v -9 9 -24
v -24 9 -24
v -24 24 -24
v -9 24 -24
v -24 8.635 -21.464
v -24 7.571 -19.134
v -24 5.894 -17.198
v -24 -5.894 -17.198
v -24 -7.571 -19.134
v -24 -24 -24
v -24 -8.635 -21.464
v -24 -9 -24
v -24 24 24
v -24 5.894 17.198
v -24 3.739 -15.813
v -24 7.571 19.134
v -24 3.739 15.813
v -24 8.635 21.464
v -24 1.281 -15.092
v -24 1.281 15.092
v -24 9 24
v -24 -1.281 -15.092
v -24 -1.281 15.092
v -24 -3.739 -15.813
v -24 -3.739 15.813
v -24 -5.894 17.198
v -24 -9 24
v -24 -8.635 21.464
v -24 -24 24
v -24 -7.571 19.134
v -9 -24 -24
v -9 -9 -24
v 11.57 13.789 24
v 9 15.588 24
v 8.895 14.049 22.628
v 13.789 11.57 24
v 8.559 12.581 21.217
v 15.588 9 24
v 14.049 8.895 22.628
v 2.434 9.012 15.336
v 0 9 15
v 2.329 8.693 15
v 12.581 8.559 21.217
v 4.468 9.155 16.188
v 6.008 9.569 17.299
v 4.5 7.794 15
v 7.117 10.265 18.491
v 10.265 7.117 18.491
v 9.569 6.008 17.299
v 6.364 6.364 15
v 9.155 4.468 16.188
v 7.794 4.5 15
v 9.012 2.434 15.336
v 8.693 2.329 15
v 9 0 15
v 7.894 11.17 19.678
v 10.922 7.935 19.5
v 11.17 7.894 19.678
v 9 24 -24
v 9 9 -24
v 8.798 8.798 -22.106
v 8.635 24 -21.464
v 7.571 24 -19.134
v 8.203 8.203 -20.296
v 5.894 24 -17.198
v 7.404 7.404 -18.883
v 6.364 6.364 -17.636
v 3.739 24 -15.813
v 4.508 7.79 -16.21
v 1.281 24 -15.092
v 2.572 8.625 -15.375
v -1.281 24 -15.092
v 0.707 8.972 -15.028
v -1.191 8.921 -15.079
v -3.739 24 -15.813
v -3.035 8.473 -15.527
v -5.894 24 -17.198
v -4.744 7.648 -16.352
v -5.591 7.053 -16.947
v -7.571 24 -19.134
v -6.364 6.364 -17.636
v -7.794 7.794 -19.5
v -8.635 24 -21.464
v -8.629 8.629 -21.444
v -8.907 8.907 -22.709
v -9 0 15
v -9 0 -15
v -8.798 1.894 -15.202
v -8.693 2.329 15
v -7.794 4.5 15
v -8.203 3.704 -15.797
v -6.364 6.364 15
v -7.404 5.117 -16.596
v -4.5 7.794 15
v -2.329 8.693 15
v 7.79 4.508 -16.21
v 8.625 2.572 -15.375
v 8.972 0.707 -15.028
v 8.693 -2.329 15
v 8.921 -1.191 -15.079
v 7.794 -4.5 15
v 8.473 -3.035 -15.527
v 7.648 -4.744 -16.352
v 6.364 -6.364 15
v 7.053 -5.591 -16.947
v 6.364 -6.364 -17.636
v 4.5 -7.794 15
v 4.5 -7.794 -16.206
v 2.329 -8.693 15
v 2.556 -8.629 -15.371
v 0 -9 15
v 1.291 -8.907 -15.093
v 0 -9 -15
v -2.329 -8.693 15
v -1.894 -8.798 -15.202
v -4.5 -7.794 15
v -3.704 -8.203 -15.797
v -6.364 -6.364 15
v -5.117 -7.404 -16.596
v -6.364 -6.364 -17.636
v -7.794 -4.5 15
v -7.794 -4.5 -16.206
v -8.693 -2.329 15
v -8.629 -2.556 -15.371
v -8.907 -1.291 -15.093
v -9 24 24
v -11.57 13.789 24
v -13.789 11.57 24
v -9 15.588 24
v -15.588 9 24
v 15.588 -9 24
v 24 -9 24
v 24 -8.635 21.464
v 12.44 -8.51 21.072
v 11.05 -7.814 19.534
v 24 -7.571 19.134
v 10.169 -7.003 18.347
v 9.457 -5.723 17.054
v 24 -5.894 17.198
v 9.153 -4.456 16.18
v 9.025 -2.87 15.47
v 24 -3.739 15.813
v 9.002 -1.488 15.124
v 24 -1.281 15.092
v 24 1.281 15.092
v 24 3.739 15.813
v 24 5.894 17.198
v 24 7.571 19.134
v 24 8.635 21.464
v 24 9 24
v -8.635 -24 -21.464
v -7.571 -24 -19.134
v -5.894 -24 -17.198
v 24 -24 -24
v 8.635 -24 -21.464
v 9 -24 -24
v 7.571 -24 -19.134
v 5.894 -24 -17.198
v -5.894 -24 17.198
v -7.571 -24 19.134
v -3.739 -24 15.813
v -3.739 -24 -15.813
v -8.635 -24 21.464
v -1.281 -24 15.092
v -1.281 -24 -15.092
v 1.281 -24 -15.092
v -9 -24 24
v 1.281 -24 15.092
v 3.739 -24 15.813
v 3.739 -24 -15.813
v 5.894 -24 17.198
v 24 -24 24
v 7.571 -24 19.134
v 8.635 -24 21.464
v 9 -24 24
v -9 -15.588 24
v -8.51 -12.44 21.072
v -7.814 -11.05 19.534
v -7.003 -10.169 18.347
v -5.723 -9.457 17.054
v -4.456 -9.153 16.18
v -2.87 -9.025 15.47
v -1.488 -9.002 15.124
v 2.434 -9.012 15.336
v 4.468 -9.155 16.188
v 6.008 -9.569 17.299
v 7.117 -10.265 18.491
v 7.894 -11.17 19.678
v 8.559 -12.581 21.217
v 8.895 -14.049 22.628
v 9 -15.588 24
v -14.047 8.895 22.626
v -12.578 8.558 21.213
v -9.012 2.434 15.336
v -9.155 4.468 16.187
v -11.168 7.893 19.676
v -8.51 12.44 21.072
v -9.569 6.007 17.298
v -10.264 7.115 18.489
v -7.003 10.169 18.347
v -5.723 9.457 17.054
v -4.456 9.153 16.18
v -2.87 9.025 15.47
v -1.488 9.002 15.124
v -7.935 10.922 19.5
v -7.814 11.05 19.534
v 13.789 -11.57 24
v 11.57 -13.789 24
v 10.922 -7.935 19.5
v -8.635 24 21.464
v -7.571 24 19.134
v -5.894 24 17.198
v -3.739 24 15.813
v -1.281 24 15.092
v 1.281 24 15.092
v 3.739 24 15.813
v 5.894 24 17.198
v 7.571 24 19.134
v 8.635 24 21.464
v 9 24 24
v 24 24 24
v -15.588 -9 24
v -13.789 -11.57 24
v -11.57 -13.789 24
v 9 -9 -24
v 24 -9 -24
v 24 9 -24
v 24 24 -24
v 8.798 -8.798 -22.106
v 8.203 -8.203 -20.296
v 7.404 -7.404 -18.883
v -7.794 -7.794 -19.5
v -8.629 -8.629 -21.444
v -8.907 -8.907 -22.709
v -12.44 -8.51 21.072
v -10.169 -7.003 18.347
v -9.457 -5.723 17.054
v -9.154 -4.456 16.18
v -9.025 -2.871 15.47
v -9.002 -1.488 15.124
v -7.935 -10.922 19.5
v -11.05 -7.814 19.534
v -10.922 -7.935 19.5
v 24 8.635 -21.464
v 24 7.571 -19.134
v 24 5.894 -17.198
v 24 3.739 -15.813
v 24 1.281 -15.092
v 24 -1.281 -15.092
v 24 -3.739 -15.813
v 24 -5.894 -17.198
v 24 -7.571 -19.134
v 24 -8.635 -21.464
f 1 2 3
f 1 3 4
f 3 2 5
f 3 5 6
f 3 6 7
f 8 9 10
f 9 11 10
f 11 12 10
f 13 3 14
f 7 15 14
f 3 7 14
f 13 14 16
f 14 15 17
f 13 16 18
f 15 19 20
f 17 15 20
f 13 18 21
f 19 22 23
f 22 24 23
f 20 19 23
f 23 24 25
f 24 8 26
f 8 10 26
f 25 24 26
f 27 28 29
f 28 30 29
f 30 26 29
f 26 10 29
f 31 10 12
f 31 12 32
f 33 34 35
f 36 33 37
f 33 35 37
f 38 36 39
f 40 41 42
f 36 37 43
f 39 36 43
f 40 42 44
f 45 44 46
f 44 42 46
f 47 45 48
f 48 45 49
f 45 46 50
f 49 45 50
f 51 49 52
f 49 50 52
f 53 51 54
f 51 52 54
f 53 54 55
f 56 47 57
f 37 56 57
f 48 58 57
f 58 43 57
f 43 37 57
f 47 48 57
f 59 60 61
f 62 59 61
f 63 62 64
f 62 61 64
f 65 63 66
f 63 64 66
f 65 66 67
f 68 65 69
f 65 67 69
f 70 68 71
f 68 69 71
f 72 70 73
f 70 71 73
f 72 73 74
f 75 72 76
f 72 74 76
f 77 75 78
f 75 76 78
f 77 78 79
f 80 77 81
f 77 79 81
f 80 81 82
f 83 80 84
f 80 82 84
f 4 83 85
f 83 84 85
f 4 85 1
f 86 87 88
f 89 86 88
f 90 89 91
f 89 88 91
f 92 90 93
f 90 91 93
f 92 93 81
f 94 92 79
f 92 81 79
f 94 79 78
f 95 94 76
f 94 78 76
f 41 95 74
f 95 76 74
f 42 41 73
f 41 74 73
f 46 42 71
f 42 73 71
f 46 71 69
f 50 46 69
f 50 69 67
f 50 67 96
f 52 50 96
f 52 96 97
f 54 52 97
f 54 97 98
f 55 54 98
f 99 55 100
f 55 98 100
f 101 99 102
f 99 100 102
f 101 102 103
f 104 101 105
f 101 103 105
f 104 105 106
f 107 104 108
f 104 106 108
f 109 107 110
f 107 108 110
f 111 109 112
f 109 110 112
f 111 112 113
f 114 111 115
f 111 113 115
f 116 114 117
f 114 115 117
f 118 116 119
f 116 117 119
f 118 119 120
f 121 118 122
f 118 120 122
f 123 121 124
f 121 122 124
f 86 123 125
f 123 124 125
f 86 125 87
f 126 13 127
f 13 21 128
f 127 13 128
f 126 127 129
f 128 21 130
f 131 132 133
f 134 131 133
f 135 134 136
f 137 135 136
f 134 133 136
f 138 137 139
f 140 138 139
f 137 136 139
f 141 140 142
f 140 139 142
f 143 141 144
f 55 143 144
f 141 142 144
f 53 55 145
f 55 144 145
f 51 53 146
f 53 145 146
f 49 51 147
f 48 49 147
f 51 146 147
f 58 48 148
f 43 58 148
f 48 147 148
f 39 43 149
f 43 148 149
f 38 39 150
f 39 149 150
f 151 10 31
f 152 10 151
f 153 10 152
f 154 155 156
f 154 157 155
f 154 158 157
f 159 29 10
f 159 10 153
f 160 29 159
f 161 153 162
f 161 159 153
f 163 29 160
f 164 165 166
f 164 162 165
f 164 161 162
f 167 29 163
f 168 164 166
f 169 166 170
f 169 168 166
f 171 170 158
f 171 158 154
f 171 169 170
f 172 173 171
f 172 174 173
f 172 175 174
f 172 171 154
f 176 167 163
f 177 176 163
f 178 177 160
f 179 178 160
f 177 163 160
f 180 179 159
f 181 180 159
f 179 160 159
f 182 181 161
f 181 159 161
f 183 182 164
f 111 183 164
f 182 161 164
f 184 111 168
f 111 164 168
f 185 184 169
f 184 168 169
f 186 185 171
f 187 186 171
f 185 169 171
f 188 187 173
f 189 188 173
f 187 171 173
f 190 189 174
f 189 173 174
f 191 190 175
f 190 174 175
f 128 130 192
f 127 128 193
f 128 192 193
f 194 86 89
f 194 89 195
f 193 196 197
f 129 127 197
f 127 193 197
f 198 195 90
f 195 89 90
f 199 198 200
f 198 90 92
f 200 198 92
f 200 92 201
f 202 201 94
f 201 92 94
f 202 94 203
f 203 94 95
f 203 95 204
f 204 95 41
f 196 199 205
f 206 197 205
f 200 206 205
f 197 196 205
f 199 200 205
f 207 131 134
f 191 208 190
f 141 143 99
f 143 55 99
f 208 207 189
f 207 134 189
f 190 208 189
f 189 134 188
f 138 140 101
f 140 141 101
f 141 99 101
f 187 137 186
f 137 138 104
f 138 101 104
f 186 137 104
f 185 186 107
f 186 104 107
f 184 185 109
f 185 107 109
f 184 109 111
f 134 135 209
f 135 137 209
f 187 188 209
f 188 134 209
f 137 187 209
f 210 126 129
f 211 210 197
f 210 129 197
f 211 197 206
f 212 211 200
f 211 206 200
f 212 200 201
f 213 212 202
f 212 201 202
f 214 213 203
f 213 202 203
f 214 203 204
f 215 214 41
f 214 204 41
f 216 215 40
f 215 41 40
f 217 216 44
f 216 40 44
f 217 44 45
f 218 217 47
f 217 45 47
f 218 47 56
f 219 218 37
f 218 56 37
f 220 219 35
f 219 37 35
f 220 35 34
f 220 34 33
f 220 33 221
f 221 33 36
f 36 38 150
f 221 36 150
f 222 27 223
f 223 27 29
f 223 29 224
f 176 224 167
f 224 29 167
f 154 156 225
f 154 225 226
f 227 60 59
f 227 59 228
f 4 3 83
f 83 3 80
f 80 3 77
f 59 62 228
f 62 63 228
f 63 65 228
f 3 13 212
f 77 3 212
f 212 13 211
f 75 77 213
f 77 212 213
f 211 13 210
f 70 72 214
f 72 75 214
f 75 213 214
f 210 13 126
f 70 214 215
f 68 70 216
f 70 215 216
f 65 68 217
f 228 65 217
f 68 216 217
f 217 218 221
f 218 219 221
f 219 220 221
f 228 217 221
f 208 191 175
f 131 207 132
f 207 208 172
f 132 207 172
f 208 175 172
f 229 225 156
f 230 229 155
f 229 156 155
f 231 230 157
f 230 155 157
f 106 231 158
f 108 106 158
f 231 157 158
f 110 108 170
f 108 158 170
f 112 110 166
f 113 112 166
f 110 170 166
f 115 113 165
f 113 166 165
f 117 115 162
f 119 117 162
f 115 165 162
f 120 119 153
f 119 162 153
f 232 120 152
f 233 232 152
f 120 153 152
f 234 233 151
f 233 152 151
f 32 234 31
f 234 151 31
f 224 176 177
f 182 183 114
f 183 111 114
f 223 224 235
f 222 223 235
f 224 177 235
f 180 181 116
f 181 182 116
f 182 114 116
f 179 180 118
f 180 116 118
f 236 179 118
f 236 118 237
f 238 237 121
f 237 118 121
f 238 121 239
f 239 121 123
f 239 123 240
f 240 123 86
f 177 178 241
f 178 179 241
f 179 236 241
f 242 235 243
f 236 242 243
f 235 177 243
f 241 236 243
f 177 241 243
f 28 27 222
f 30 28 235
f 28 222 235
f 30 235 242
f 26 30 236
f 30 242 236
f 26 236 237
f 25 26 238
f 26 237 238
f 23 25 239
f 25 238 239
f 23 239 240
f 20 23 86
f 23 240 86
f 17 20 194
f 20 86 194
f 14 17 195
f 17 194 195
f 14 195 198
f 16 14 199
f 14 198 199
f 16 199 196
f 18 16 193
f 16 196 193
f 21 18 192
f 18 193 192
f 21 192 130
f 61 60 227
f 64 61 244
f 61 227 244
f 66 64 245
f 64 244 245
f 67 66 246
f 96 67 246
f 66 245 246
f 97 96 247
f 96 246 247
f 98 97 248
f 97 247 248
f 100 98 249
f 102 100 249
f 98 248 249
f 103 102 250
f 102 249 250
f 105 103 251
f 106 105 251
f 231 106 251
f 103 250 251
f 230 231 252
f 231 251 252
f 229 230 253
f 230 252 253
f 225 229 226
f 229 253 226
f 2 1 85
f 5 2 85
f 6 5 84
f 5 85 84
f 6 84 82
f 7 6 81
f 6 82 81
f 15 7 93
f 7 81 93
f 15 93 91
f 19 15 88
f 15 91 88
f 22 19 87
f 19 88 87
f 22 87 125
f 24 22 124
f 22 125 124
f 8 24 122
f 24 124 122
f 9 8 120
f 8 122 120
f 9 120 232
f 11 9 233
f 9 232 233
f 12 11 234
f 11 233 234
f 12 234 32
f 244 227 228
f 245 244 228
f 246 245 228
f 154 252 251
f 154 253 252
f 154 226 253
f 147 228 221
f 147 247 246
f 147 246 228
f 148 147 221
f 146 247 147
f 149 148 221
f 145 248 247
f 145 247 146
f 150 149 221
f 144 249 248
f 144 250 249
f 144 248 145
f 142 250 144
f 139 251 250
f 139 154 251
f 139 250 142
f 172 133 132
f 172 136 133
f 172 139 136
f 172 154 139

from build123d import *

# Parameters (mm, degrees)
F0_W           = 48
F0_H           = 48
F1_DEPTH       = 24
F2_R           = 9
F3_DEPTH       = 48
F6_D           = 18
F6_CSINK_D     = 36
F6_CSINK_ANGLE = 90
F4_R           = 9
F7_DEPTH       = 48


with BuildPart() as f1:
    # F0 (on Front) → F1 (new body, symmetric)
    with BuildSketch(Plane.XZ):
        Rectangle(F0_W, F0_H)
    extrude(amount=F1_DEPTH, both=True)

    # F2 (on face) → F3 (cut)
    with BuildSketch(Plane.XZ.offset(24)):
        with Locations((0, 24)):
            Circle(F2_R)
        with Locations((0, -24)):
            Circle(F2_R)
    extrude(amount=-F3_DEPTH, mode=Mode.SUBTRACT)

    # F6 (through all)
    with Locations(Plane.XY.offset(24)):
        with Locations((0, 0)):
            CounterSinkHole(F6_D / 2, F6_CSINK_D / 2, counter_sink_angle=F6_CSINK_ANGLE)

    # F4 (on face) → F7 (cut)
    with BuildSketch(Plane.YZ.offset(24)):
        with Locations((0, 24)):
            Circle(F4_R)
        with Locations((0, -24)):
            Circle(F4_R)
    extrude(amount=-F7_DEPTH, mode=Mode.SUBTRACT)


solid = f1.part
